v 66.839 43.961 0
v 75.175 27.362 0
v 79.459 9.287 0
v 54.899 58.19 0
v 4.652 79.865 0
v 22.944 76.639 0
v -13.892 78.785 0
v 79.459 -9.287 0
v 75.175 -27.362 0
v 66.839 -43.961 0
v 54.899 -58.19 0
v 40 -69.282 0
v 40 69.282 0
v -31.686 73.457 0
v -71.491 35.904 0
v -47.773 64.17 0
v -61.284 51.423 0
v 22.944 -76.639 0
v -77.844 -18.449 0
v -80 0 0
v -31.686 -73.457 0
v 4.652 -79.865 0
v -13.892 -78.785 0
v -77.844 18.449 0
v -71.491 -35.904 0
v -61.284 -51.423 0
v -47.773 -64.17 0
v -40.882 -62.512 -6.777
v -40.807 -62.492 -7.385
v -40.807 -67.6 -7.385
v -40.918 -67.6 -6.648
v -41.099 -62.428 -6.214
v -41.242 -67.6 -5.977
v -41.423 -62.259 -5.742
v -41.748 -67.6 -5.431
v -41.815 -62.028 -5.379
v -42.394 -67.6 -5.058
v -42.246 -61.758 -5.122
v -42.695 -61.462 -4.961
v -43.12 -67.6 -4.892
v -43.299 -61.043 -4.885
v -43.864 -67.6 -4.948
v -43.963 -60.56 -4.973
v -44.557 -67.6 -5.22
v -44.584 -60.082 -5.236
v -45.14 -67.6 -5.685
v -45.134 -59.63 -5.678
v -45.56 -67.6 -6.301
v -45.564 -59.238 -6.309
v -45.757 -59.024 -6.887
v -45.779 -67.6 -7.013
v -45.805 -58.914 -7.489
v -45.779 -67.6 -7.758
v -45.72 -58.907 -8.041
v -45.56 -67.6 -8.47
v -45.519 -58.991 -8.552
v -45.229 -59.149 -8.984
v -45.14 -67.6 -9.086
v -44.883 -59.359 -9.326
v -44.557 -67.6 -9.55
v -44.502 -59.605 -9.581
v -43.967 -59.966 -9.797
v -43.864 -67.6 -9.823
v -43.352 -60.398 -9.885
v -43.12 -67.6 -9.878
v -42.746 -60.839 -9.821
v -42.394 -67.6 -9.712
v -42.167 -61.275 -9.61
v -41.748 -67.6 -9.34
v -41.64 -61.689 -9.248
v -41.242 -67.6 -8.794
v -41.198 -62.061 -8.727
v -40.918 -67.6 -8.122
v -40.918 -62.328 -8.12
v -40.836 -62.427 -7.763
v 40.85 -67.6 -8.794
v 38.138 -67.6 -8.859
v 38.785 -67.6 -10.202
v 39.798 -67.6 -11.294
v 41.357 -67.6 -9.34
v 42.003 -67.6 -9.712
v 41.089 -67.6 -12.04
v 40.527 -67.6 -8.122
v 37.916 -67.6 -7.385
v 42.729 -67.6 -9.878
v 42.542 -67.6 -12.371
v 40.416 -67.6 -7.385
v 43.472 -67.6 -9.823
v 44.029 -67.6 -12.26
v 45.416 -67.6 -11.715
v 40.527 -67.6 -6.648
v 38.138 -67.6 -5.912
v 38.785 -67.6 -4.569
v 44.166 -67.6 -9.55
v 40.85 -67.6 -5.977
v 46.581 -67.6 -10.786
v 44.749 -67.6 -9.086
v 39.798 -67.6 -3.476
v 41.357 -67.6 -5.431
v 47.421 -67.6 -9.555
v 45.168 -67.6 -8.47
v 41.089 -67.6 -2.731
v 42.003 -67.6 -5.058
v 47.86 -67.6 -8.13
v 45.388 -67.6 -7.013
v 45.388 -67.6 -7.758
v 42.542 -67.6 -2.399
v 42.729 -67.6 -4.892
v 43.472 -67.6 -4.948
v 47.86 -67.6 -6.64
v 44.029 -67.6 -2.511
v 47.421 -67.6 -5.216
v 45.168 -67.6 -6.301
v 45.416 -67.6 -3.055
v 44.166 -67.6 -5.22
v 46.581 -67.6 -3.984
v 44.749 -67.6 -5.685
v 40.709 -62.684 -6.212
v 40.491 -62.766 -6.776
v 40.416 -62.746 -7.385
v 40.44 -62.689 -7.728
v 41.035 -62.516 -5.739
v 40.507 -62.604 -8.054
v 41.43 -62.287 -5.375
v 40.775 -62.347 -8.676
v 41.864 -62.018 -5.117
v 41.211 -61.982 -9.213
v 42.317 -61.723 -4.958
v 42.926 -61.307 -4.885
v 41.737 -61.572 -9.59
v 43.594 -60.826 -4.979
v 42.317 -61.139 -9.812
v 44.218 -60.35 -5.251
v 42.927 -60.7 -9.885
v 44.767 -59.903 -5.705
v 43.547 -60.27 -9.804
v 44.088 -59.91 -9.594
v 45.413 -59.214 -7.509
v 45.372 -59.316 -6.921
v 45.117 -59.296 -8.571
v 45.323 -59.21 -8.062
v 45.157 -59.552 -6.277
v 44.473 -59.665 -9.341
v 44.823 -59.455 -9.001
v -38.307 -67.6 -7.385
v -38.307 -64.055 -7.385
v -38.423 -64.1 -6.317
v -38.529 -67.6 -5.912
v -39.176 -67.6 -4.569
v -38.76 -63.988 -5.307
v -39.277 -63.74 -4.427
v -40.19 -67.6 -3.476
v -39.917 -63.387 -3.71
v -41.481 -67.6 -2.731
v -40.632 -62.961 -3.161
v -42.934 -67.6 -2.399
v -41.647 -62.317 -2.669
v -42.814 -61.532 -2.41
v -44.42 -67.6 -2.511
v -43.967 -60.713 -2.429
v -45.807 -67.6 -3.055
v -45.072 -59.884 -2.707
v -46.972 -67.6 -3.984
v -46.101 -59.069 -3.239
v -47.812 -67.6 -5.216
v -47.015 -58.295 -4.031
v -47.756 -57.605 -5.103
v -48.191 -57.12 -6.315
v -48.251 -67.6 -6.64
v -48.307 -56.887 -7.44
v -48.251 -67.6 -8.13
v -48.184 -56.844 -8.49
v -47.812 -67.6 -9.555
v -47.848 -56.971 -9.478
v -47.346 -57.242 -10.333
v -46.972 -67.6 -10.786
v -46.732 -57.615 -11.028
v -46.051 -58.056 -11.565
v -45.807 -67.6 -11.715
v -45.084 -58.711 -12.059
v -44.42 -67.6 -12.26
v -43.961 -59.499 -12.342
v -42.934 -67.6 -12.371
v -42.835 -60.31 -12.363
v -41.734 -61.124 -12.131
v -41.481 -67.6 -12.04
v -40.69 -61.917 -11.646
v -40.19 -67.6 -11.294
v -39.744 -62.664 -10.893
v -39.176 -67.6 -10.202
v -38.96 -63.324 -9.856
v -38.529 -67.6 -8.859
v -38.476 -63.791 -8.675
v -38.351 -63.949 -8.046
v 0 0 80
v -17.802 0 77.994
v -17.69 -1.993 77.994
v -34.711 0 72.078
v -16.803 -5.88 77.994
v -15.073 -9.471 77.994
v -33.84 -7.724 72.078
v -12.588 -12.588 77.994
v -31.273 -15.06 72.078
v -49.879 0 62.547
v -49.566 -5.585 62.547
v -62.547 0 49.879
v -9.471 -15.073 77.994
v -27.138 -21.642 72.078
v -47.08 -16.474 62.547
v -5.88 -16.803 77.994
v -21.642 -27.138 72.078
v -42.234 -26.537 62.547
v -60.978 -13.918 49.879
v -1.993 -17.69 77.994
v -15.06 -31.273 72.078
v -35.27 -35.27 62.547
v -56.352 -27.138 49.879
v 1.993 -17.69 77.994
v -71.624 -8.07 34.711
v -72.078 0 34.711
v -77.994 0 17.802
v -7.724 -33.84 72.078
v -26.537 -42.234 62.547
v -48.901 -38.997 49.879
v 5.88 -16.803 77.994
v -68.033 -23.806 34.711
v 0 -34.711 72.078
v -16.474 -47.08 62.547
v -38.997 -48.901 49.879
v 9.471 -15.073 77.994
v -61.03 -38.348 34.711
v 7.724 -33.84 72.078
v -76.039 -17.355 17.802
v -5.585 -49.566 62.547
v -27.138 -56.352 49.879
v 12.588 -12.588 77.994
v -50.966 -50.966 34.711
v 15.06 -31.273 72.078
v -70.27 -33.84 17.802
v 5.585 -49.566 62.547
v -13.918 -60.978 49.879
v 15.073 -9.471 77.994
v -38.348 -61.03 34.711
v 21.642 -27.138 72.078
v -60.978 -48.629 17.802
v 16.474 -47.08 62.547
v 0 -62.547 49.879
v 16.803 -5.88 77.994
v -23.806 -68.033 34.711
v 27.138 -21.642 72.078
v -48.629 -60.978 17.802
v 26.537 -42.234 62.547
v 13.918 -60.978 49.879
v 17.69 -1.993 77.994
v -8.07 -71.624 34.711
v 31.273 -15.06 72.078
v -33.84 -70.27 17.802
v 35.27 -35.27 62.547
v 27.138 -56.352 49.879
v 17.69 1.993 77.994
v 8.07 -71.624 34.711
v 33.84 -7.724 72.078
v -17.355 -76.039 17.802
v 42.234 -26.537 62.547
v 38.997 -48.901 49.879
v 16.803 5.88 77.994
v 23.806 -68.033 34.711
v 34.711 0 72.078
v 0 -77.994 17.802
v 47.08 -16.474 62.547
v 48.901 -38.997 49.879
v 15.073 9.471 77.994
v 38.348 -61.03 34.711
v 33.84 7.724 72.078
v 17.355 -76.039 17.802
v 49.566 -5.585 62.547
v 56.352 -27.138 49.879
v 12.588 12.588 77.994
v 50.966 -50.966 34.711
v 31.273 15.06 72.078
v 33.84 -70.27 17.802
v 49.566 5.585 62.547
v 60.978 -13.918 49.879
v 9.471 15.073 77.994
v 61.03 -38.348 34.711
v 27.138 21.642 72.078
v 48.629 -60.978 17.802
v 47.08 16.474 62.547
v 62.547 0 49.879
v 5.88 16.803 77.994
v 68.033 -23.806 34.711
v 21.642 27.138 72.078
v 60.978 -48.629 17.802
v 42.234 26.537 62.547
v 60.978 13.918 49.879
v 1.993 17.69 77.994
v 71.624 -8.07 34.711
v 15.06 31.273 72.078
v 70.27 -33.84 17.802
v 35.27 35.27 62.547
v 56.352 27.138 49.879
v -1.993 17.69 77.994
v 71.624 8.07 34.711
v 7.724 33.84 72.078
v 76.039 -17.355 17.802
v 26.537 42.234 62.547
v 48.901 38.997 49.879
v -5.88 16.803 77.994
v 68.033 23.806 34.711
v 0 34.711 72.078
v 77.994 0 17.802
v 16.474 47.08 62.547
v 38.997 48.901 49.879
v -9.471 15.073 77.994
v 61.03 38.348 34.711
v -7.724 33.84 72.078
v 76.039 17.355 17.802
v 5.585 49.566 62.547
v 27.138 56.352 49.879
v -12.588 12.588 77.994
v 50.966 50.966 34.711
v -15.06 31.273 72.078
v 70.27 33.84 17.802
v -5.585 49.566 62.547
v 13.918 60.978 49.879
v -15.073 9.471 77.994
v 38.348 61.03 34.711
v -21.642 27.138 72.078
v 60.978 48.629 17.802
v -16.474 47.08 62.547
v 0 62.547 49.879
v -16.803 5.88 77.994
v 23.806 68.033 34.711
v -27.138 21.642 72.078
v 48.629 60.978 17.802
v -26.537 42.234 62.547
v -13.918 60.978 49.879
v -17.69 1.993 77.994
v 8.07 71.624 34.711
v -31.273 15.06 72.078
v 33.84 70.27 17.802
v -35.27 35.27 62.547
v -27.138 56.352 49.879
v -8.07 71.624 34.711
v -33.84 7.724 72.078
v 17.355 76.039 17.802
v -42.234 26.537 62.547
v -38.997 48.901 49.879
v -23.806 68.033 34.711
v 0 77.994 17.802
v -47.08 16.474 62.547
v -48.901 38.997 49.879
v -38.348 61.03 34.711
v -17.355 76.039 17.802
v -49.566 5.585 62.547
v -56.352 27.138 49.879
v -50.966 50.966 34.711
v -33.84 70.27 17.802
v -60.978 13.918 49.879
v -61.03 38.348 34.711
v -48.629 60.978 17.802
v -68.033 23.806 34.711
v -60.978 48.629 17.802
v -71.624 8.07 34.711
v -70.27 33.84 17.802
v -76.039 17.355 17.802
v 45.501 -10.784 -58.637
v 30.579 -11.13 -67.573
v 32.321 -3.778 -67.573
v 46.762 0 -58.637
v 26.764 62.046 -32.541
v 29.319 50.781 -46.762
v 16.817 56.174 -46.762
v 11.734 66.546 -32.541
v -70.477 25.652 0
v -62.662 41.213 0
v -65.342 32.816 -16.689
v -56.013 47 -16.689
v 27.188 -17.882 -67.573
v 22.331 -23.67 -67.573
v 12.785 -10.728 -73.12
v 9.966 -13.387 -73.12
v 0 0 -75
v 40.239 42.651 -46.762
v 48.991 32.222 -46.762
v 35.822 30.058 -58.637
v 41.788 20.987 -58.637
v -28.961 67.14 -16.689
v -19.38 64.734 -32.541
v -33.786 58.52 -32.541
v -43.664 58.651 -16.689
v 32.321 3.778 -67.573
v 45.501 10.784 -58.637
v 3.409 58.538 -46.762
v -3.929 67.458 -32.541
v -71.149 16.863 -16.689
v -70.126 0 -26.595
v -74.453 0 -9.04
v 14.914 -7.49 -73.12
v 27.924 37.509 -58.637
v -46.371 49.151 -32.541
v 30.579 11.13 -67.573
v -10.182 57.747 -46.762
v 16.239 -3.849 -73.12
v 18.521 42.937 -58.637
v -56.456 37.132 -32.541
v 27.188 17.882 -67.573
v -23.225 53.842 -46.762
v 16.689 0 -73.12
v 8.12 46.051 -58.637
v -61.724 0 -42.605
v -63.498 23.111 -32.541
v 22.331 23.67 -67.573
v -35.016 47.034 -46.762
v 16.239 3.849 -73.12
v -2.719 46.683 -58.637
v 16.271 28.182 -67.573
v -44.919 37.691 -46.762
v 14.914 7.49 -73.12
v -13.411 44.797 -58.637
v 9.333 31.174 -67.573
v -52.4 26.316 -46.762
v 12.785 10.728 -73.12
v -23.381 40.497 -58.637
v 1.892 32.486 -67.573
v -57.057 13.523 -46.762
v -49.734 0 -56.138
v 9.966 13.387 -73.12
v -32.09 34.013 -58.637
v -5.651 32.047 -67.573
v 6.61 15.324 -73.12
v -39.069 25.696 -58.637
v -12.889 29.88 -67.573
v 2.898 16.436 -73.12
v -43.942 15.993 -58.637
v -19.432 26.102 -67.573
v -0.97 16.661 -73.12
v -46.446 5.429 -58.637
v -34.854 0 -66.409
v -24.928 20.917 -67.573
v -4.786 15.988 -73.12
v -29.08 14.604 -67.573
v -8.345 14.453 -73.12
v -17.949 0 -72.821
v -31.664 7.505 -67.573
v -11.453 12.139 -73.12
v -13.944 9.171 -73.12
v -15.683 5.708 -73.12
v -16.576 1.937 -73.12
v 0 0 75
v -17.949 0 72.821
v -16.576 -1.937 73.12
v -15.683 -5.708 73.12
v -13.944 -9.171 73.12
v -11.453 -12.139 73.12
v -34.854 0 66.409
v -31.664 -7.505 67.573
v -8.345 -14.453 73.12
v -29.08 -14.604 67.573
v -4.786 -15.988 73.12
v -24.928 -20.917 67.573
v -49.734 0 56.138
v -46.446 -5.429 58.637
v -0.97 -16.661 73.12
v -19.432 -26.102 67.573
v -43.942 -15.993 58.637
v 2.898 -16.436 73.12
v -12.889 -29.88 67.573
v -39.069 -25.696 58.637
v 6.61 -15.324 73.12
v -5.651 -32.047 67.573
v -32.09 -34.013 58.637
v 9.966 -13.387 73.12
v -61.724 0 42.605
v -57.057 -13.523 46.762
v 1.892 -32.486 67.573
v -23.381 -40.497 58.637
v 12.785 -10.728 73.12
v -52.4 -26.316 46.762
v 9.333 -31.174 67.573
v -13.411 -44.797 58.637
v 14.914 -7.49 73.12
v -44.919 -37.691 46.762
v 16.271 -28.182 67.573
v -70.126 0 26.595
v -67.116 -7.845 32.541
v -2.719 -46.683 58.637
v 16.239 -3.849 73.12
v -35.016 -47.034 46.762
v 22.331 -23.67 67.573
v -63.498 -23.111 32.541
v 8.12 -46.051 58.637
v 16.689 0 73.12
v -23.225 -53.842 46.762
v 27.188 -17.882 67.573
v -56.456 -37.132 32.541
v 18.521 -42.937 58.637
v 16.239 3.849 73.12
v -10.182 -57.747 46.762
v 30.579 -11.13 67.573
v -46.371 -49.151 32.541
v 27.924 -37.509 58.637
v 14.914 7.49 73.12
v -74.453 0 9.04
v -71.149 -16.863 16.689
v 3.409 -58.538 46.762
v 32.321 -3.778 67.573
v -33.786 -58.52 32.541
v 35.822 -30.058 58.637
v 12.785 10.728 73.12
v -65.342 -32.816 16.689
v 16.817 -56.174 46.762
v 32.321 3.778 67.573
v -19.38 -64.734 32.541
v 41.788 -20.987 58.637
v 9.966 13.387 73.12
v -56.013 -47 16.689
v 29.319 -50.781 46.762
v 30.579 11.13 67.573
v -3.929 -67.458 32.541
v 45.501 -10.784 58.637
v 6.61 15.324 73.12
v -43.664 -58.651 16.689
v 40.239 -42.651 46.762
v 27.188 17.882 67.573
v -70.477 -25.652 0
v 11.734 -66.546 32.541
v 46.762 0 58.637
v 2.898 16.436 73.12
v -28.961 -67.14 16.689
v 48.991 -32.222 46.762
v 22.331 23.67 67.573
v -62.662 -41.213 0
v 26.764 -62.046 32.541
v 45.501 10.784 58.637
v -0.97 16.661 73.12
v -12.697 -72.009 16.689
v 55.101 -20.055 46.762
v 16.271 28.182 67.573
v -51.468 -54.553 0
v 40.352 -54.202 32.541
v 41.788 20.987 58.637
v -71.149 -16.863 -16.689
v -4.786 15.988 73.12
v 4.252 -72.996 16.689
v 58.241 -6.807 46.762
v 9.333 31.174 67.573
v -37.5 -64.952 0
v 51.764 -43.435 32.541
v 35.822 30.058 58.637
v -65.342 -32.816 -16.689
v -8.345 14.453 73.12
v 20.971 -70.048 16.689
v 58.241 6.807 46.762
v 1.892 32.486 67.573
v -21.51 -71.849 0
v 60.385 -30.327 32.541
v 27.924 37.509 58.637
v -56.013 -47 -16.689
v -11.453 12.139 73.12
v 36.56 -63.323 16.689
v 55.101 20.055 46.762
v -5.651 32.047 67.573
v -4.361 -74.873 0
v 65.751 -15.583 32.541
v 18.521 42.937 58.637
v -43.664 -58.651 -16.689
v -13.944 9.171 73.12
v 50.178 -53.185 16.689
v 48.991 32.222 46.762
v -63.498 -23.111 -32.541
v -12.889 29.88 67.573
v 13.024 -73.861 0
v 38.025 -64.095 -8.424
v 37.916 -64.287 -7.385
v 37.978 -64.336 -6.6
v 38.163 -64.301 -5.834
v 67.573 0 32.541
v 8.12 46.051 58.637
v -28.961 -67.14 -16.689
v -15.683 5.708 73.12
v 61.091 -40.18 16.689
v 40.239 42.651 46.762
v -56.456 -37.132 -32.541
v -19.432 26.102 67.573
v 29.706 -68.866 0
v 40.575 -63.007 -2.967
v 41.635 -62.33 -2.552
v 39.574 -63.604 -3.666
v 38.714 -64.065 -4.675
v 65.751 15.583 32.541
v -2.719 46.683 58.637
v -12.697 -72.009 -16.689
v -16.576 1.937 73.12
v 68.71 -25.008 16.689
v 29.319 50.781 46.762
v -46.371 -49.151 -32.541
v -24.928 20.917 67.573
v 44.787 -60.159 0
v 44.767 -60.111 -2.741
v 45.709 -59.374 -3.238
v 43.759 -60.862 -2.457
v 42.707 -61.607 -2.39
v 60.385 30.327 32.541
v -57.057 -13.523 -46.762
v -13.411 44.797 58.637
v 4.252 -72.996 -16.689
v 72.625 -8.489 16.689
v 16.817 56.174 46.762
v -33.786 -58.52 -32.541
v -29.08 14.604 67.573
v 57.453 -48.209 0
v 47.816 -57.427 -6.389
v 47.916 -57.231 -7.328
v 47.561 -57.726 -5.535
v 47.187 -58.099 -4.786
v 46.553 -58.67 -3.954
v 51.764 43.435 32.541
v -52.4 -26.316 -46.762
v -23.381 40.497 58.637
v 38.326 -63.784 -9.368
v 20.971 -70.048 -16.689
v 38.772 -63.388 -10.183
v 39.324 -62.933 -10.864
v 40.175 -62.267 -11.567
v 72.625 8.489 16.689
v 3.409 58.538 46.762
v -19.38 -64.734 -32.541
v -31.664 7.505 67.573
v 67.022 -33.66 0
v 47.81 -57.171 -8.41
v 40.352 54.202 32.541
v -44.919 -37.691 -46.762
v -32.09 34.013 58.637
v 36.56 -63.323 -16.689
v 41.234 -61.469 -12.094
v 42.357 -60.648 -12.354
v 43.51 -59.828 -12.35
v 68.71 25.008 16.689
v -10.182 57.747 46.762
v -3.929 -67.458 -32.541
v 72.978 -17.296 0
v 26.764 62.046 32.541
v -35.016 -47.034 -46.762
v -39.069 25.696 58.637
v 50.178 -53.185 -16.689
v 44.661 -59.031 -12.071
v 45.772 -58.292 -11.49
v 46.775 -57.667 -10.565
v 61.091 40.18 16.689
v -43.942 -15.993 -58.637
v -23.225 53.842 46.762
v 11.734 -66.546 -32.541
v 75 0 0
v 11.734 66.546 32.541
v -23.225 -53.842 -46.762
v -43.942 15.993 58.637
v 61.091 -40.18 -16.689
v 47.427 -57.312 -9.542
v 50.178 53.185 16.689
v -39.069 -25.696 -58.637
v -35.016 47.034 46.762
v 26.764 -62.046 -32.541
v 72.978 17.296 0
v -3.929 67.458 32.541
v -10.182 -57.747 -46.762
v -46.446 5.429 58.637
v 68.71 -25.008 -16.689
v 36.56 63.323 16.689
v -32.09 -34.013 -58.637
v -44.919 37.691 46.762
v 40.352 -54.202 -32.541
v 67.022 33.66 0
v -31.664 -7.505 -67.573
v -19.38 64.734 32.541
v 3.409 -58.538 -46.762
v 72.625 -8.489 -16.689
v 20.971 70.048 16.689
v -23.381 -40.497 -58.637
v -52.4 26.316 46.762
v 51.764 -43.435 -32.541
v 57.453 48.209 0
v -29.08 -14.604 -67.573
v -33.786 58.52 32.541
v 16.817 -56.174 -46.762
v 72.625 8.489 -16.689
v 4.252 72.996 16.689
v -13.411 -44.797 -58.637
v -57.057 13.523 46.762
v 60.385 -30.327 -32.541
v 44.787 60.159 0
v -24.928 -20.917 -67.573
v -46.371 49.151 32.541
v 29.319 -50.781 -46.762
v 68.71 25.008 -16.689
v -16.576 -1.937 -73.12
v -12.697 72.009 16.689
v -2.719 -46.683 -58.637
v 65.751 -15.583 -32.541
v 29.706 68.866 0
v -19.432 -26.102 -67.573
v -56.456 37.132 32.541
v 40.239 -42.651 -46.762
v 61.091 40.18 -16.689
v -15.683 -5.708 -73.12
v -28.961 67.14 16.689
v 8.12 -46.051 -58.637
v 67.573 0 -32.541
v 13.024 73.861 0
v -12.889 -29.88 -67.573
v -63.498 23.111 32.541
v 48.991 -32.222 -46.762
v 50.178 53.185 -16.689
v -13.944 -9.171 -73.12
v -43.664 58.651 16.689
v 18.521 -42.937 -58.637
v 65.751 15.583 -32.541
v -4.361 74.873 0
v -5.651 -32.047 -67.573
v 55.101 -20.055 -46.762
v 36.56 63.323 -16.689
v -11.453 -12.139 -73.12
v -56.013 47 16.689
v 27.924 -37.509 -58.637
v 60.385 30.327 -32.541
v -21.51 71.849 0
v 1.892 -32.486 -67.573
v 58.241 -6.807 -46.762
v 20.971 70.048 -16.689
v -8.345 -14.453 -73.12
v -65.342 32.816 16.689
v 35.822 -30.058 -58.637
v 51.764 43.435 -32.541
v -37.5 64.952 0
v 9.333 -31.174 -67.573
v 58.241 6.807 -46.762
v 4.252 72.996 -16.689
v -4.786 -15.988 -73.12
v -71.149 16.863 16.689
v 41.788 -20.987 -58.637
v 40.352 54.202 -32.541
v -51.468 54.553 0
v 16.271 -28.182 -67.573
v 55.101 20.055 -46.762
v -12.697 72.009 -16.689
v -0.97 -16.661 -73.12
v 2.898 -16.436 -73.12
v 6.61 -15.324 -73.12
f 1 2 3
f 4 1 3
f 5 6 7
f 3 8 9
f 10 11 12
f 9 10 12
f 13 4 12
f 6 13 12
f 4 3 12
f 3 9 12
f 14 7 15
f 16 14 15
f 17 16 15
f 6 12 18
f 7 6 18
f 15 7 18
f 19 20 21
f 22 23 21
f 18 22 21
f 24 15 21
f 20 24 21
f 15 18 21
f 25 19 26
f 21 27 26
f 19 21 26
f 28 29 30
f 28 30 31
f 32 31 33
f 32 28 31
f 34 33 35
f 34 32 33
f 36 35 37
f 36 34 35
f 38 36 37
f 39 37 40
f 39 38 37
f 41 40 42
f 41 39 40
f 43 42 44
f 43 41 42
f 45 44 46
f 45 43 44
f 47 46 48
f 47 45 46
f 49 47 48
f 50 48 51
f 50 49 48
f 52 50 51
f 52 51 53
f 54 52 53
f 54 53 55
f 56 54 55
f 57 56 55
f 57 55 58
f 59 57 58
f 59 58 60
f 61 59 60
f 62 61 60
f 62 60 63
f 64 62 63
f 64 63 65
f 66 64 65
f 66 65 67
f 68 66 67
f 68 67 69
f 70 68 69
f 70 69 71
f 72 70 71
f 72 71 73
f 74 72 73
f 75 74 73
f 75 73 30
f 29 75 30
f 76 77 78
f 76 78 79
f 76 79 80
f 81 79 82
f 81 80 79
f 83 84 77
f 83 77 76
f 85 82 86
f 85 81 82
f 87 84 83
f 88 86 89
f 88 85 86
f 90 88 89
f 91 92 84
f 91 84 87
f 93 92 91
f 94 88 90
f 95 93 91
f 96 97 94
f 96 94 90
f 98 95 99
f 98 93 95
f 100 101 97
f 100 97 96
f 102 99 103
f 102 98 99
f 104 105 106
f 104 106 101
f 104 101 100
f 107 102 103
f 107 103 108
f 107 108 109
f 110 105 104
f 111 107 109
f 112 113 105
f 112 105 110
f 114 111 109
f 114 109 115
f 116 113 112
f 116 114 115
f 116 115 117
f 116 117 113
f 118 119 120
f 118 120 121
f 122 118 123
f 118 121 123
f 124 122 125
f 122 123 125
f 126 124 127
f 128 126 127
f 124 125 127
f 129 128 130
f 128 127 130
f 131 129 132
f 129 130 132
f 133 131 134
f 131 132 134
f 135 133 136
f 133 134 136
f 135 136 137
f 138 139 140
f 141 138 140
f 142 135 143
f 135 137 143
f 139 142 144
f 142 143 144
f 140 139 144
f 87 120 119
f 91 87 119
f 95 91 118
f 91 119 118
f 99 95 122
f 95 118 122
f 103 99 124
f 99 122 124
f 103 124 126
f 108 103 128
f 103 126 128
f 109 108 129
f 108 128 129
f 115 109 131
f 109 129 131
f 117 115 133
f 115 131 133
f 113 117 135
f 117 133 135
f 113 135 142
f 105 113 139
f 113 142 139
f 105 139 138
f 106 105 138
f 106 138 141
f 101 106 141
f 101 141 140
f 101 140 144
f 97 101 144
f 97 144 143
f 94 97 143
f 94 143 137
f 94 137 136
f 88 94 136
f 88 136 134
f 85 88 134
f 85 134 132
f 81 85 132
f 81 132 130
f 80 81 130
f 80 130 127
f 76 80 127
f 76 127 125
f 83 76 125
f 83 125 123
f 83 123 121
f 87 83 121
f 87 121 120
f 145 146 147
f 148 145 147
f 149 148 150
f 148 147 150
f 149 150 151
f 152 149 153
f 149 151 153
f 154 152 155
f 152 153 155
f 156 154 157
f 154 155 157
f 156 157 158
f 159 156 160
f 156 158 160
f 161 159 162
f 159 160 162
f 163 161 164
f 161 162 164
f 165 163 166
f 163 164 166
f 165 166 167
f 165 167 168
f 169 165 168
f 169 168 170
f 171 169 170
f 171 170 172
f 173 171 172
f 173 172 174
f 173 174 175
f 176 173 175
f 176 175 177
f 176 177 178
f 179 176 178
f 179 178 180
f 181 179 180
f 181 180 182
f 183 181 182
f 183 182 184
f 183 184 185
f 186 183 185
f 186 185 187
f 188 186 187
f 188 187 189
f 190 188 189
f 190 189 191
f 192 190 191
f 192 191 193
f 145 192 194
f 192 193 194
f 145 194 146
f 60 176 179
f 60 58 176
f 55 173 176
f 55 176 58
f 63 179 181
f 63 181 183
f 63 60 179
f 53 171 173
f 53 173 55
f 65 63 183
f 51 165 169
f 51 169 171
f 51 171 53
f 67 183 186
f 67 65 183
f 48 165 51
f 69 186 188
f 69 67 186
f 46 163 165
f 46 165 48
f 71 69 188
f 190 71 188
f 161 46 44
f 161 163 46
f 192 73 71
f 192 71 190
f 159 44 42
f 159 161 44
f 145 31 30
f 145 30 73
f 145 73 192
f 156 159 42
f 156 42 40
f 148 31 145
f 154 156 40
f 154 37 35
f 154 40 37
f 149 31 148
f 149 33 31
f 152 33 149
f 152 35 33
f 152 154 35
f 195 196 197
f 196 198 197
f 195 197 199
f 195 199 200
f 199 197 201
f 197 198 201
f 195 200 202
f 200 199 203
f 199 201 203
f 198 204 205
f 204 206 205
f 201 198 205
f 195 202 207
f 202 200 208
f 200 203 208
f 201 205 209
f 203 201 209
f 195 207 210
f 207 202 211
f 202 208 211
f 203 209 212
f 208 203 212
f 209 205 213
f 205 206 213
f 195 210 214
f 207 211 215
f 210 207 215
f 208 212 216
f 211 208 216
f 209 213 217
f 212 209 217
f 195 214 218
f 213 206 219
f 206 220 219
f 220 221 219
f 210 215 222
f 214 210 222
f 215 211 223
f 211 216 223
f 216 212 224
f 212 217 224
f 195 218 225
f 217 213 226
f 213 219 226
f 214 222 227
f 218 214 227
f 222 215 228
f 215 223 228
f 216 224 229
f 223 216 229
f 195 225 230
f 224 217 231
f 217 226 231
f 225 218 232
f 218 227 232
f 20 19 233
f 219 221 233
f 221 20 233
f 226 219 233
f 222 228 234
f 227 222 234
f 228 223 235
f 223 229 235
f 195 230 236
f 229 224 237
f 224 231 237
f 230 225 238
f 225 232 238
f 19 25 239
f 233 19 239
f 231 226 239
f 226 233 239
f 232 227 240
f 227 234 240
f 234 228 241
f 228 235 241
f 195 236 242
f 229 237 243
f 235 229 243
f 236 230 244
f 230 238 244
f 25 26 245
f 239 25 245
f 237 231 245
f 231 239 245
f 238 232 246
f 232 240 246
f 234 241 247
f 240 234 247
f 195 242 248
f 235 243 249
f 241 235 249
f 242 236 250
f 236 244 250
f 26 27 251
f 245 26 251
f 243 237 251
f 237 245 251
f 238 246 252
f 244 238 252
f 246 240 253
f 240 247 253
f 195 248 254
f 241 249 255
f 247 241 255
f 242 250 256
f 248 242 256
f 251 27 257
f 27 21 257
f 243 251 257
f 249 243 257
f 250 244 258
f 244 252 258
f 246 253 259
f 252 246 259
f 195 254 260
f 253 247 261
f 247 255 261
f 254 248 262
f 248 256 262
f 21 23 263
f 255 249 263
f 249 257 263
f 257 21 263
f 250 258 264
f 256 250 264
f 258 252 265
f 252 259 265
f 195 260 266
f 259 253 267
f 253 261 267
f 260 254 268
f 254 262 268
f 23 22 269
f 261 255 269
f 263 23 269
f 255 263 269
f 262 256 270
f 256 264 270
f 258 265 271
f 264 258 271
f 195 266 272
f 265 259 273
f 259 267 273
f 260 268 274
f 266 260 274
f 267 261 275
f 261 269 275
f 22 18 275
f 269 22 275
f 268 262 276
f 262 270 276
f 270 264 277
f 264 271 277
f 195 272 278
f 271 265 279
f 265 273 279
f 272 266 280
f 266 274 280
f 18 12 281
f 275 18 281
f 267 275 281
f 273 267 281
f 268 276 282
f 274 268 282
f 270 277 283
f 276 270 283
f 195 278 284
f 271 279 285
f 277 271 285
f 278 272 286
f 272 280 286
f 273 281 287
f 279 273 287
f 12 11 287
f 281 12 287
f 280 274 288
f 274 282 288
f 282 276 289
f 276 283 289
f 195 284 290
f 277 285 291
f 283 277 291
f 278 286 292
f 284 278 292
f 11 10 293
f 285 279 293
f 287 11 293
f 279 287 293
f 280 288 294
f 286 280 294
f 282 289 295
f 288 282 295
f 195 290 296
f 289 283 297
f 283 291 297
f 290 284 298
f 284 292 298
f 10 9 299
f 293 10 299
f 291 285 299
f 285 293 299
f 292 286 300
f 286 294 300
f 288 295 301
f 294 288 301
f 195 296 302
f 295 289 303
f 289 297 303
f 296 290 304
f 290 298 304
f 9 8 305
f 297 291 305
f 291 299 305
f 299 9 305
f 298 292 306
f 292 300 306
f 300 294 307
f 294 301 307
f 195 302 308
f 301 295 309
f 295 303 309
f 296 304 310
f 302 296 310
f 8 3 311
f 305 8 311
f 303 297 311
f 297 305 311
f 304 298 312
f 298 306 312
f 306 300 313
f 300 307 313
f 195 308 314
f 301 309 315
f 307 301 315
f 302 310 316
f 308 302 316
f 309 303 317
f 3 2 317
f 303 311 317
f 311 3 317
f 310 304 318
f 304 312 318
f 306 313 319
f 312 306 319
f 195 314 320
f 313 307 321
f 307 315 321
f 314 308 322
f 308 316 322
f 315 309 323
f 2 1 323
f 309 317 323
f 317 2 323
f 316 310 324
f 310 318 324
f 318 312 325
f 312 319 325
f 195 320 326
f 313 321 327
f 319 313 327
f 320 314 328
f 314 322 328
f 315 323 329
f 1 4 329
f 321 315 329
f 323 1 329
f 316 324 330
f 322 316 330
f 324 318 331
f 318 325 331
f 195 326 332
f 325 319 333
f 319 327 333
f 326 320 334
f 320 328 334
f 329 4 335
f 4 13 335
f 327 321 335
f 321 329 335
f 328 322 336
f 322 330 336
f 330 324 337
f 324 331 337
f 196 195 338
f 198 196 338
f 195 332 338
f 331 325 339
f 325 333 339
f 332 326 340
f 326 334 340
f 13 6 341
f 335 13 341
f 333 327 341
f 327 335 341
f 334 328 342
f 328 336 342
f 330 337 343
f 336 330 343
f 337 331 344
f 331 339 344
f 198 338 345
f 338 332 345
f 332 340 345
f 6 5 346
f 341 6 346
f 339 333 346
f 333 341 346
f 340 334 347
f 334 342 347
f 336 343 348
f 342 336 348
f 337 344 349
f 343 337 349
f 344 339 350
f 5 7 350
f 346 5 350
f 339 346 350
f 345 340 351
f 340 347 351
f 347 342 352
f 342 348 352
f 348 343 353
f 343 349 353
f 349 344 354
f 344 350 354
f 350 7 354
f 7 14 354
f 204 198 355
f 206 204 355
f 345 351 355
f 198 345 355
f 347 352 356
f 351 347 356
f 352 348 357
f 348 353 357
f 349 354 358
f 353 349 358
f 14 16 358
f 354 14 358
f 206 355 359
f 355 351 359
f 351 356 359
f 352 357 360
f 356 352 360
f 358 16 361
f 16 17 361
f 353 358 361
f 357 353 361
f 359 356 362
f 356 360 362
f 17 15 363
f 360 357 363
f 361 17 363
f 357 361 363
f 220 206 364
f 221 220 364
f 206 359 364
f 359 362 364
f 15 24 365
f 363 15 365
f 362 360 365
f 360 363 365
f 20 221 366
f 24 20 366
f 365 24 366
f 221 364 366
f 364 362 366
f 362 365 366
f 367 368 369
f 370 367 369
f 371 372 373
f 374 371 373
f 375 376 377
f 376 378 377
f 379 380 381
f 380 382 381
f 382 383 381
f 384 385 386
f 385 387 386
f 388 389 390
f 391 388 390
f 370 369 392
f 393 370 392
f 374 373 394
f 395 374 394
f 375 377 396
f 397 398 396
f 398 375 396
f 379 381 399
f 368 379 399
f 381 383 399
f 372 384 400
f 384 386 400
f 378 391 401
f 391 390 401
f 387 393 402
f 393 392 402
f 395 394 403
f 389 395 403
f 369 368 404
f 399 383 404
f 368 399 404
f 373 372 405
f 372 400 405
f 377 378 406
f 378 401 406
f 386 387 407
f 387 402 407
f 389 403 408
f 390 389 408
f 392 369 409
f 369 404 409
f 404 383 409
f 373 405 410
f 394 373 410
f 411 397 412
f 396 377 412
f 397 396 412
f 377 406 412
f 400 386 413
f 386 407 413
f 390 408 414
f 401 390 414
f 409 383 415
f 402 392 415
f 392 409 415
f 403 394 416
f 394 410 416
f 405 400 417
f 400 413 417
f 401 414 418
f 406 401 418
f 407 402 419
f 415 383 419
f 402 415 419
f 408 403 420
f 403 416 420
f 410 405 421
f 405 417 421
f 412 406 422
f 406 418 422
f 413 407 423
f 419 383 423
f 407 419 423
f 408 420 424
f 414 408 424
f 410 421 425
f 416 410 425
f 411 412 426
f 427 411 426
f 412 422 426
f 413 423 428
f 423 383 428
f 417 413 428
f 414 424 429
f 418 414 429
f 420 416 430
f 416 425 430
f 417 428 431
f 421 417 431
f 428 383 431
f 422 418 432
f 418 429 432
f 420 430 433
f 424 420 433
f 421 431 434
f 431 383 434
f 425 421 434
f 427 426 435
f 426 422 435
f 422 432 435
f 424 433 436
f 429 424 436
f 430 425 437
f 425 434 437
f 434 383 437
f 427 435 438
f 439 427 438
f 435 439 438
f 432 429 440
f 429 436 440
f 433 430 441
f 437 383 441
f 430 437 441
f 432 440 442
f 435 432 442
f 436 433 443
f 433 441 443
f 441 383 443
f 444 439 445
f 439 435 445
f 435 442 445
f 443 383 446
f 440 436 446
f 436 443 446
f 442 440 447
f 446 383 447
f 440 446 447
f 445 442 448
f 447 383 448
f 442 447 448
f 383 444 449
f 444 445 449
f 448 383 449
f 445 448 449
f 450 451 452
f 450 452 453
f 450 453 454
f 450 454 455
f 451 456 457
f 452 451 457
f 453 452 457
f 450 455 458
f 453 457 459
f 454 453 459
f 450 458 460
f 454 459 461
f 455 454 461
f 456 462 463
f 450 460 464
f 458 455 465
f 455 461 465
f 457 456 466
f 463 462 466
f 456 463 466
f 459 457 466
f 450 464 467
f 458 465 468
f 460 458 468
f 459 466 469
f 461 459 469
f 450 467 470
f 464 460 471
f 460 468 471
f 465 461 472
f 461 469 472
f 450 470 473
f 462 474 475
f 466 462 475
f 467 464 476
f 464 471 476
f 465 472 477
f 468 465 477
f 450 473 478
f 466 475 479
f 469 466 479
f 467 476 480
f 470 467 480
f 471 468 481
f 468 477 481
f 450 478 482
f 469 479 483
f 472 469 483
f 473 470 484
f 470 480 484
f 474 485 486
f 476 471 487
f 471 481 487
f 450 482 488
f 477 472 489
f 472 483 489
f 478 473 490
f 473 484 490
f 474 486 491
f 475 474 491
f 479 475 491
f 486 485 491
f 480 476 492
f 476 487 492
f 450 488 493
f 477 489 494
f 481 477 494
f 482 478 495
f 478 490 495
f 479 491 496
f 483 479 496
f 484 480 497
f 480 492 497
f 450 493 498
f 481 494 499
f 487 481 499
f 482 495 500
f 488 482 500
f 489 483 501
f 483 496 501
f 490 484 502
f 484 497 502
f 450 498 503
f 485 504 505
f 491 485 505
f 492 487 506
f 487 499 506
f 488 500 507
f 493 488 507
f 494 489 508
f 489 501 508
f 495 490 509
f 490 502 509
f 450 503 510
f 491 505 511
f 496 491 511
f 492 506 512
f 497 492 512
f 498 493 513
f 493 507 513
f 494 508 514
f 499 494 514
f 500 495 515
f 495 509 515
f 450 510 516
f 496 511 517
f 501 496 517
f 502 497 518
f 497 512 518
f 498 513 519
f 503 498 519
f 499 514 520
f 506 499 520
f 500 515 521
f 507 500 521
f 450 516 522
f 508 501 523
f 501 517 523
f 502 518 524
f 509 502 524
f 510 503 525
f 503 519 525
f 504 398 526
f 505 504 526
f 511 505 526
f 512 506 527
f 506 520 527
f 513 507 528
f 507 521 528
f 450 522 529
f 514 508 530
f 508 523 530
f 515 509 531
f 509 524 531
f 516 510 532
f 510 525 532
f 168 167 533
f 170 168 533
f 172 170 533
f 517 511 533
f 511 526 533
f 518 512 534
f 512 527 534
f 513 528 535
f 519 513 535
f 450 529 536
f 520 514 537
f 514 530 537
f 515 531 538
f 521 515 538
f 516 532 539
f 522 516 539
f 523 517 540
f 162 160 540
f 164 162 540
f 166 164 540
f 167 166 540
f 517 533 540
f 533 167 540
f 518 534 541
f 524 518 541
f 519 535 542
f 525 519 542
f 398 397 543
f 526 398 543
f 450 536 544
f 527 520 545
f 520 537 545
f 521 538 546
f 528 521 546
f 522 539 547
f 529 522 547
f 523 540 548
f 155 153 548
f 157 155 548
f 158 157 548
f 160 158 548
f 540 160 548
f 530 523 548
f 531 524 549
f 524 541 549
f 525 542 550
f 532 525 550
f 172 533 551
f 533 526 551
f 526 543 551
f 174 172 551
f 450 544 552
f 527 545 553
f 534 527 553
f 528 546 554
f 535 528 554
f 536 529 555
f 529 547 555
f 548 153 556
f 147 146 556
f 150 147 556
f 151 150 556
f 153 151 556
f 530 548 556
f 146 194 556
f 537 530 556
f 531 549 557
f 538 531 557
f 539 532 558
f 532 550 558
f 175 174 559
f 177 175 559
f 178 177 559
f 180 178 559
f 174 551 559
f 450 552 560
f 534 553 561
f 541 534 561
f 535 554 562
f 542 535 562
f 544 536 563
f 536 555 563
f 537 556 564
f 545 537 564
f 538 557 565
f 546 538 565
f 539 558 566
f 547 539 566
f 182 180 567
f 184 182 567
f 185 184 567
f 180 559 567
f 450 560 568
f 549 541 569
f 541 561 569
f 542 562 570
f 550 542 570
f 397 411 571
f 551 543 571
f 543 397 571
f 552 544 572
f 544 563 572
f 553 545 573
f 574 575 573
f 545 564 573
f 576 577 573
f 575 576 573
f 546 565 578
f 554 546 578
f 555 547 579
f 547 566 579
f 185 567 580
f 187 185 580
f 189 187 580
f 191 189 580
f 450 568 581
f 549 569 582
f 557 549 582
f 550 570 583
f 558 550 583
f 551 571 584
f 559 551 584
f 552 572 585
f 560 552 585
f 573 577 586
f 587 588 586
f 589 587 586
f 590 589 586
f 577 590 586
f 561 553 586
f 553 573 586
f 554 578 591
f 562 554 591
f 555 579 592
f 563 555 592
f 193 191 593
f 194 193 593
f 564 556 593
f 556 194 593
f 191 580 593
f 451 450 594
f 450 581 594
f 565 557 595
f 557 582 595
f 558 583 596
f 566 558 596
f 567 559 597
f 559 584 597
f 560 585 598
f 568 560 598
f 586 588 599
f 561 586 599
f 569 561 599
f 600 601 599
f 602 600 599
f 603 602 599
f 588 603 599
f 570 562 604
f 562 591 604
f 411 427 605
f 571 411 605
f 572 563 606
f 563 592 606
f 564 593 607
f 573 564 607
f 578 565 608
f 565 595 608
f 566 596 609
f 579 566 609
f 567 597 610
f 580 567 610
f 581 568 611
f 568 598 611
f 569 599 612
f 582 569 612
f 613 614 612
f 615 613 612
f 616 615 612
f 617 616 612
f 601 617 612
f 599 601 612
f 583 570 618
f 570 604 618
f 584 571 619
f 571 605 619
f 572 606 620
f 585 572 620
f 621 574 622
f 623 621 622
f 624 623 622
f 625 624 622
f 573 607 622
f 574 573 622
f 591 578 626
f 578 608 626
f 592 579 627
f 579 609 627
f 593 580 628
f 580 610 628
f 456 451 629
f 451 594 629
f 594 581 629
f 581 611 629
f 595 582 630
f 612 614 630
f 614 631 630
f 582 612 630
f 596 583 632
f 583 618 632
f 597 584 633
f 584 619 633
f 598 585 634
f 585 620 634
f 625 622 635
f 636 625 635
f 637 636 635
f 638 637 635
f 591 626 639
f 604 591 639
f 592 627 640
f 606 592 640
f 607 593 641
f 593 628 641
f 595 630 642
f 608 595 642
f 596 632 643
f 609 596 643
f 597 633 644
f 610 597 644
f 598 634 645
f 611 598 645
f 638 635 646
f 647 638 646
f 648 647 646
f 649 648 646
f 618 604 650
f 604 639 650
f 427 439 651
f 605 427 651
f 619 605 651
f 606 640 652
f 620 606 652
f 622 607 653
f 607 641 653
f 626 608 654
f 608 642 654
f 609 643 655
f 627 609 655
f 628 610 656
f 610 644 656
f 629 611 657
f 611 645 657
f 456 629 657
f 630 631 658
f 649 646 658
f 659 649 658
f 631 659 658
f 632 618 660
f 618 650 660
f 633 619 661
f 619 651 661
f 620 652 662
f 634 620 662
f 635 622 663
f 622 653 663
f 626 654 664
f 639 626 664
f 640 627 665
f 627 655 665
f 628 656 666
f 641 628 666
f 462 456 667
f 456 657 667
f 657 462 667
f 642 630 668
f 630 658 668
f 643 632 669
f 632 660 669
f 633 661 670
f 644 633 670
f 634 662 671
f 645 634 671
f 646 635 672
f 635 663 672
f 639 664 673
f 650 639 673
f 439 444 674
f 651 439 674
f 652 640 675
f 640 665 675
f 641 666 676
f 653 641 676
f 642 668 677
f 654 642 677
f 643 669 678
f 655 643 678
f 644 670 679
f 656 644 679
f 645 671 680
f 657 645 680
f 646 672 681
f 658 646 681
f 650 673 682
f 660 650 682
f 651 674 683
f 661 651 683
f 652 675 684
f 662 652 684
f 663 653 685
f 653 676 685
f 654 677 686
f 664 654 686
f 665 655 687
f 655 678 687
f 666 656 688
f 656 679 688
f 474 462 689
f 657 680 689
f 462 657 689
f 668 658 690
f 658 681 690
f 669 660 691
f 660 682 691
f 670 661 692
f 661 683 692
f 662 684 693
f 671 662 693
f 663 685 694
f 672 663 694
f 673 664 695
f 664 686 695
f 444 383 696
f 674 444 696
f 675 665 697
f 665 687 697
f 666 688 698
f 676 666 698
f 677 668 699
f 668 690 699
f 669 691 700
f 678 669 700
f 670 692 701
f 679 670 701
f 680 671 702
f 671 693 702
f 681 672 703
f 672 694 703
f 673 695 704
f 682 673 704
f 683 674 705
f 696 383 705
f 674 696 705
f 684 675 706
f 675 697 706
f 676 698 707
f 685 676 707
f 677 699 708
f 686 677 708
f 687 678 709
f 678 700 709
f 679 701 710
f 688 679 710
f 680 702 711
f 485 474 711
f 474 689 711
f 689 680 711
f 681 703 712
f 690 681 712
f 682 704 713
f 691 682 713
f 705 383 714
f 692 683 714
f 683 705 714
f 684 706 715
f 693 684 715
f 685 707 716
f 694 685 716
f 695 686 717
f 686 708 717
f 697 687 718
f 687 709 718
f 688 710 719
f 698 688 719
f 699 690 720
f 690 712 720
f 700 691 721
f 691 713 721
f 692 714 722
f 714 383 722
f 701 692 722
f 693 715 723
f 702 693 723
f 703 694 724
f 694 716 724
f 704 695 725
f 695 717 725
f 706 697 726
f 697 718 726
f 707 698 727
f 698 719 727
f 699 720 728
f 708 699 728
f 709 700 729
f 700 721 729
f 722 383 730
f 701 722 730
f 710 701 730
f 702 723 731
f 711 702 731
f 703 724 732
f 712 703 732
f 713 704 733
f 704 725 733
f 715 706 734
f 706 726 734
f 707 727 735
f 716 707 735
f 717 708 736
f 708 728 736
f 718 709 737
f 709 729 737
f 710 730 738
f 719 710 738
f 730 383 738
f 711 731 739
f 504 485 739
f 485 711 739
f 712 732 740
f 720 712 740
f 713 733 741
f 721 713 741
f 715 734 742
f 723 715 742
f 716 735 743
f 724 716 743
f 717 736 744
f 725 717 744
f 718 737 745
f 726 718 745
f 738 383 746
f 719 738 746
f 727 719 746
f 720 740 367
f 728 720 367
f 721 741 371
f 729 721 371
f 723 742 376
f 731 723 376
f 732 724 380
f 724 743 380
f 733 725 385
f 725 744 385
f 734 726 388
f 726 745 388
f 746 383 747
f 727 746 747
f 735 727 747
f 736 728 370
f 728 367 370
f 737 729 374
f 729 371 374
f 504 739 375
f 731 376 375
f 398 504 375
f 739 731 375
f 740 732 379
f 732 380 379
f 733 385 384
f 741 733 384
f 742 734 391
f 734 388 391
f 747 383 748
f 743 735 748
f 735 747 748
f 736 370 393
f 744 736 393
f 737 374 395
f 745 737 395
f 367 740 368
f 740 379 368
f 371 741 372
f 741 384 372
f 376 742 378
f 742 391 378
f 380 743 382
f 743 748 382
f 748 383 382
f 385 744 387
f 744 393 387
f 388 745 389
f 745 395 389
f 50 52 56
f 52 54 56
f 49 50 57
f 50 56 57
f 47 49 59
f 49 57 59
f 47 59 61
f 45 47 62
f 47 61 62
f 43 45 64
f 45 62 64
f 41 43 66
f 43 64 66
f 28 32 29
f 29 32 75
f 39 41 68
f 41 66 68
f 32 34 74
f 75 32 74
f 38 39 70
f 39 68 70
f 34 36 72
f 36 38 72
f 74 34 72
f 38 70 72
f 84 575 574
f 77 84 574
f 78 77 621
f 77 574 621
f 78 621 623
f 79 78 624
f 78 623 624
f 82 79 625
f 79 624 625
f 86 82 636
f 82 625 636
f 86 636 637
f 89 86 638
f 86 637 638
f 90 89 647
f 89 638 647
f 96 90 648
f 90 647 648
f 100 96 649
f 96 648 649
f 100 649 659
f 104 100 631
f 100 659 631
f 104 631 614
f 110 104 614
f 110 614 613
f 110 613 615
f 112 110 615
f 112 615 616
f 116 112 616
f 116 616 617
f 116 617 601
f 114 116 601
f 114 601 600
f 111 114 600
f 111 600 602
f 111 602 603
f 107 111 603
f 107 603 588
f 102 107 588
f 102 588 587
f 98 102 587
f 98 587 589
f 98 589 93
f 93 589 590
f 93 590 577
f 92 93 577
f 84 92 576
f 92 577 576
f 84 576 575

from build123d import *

# Parameters (mm, degrees)
F4_R     = 5
F4_R_2   = 2.5
F5_DEPTH = 67.6


# Not quite as in the source:
# - the program builds the solid bodies; features that only make, move or delete a surface that nothing else refers to are left out


with BuildPart() as f1:
    # F0 (on Front) → F1 (revolve)
    with BuildSketch(Plane.XZ):
        with BuildLine():
            Line((0, -75), (0, 75))
            ThreePointArc((0, 75), (-75, 0), (0, -75))
        make_face()
    revolve(axis=Axis((0, 0, 4.8243552446), (0, 0, 1)))

    # F4 (on Front) → F5 (join)
    with BuildSketch(Plane.XZ):
        with BuildLine():
            ThreePointArc((47.91594401, -7.3852874339), (42.91594401, -2.3852874339), (37.91594401, -7.3852874339))
            ThreePointArc((37.91594401, -7.3852874339), (42.91594401, -12.3852874339), (47.91594401, -7.3852874339))
        make_face()
        with BuildLine():
            ThreePointArc((45.41594401, -7.3852874339), (42.91594401, -9.8852874339), (40.41594401, -7.3852874339))
            ThreePointArc((40.41594401, -7.3852874339), (42.91594401, -4.8852874339), (45.41594401, -7.3852874339))
        make_face(mode=Mode.SUBTRACT)
        with Locations((-43.3072112501, -7.3852874339)):
            Circle(F4_R)
        with Locations((-43.3072112501, -7.3852874339)):
            Circle(F4_R_2, mode=Mode.SUBTRACT)
    extrude(amount=F5_DEPTH)


with BuildPart() as f3:
    # F2 (on Front) → F3 (revolve)
    with BuildSketch(Plane.XZ):
        with BuildLine():
            Line((0, 0), (0, 80))
            ThreePointArc((0, 80), (-56.5685424949, 56.5685424949), (-80, 0))
            Line((-80, 0), (0, 0))
        make_face()
    revolve(axis=Axis((0, 0, -0.3961585462), (0, 0, 1)))


solid = Compound([f1.part, f3.part])
